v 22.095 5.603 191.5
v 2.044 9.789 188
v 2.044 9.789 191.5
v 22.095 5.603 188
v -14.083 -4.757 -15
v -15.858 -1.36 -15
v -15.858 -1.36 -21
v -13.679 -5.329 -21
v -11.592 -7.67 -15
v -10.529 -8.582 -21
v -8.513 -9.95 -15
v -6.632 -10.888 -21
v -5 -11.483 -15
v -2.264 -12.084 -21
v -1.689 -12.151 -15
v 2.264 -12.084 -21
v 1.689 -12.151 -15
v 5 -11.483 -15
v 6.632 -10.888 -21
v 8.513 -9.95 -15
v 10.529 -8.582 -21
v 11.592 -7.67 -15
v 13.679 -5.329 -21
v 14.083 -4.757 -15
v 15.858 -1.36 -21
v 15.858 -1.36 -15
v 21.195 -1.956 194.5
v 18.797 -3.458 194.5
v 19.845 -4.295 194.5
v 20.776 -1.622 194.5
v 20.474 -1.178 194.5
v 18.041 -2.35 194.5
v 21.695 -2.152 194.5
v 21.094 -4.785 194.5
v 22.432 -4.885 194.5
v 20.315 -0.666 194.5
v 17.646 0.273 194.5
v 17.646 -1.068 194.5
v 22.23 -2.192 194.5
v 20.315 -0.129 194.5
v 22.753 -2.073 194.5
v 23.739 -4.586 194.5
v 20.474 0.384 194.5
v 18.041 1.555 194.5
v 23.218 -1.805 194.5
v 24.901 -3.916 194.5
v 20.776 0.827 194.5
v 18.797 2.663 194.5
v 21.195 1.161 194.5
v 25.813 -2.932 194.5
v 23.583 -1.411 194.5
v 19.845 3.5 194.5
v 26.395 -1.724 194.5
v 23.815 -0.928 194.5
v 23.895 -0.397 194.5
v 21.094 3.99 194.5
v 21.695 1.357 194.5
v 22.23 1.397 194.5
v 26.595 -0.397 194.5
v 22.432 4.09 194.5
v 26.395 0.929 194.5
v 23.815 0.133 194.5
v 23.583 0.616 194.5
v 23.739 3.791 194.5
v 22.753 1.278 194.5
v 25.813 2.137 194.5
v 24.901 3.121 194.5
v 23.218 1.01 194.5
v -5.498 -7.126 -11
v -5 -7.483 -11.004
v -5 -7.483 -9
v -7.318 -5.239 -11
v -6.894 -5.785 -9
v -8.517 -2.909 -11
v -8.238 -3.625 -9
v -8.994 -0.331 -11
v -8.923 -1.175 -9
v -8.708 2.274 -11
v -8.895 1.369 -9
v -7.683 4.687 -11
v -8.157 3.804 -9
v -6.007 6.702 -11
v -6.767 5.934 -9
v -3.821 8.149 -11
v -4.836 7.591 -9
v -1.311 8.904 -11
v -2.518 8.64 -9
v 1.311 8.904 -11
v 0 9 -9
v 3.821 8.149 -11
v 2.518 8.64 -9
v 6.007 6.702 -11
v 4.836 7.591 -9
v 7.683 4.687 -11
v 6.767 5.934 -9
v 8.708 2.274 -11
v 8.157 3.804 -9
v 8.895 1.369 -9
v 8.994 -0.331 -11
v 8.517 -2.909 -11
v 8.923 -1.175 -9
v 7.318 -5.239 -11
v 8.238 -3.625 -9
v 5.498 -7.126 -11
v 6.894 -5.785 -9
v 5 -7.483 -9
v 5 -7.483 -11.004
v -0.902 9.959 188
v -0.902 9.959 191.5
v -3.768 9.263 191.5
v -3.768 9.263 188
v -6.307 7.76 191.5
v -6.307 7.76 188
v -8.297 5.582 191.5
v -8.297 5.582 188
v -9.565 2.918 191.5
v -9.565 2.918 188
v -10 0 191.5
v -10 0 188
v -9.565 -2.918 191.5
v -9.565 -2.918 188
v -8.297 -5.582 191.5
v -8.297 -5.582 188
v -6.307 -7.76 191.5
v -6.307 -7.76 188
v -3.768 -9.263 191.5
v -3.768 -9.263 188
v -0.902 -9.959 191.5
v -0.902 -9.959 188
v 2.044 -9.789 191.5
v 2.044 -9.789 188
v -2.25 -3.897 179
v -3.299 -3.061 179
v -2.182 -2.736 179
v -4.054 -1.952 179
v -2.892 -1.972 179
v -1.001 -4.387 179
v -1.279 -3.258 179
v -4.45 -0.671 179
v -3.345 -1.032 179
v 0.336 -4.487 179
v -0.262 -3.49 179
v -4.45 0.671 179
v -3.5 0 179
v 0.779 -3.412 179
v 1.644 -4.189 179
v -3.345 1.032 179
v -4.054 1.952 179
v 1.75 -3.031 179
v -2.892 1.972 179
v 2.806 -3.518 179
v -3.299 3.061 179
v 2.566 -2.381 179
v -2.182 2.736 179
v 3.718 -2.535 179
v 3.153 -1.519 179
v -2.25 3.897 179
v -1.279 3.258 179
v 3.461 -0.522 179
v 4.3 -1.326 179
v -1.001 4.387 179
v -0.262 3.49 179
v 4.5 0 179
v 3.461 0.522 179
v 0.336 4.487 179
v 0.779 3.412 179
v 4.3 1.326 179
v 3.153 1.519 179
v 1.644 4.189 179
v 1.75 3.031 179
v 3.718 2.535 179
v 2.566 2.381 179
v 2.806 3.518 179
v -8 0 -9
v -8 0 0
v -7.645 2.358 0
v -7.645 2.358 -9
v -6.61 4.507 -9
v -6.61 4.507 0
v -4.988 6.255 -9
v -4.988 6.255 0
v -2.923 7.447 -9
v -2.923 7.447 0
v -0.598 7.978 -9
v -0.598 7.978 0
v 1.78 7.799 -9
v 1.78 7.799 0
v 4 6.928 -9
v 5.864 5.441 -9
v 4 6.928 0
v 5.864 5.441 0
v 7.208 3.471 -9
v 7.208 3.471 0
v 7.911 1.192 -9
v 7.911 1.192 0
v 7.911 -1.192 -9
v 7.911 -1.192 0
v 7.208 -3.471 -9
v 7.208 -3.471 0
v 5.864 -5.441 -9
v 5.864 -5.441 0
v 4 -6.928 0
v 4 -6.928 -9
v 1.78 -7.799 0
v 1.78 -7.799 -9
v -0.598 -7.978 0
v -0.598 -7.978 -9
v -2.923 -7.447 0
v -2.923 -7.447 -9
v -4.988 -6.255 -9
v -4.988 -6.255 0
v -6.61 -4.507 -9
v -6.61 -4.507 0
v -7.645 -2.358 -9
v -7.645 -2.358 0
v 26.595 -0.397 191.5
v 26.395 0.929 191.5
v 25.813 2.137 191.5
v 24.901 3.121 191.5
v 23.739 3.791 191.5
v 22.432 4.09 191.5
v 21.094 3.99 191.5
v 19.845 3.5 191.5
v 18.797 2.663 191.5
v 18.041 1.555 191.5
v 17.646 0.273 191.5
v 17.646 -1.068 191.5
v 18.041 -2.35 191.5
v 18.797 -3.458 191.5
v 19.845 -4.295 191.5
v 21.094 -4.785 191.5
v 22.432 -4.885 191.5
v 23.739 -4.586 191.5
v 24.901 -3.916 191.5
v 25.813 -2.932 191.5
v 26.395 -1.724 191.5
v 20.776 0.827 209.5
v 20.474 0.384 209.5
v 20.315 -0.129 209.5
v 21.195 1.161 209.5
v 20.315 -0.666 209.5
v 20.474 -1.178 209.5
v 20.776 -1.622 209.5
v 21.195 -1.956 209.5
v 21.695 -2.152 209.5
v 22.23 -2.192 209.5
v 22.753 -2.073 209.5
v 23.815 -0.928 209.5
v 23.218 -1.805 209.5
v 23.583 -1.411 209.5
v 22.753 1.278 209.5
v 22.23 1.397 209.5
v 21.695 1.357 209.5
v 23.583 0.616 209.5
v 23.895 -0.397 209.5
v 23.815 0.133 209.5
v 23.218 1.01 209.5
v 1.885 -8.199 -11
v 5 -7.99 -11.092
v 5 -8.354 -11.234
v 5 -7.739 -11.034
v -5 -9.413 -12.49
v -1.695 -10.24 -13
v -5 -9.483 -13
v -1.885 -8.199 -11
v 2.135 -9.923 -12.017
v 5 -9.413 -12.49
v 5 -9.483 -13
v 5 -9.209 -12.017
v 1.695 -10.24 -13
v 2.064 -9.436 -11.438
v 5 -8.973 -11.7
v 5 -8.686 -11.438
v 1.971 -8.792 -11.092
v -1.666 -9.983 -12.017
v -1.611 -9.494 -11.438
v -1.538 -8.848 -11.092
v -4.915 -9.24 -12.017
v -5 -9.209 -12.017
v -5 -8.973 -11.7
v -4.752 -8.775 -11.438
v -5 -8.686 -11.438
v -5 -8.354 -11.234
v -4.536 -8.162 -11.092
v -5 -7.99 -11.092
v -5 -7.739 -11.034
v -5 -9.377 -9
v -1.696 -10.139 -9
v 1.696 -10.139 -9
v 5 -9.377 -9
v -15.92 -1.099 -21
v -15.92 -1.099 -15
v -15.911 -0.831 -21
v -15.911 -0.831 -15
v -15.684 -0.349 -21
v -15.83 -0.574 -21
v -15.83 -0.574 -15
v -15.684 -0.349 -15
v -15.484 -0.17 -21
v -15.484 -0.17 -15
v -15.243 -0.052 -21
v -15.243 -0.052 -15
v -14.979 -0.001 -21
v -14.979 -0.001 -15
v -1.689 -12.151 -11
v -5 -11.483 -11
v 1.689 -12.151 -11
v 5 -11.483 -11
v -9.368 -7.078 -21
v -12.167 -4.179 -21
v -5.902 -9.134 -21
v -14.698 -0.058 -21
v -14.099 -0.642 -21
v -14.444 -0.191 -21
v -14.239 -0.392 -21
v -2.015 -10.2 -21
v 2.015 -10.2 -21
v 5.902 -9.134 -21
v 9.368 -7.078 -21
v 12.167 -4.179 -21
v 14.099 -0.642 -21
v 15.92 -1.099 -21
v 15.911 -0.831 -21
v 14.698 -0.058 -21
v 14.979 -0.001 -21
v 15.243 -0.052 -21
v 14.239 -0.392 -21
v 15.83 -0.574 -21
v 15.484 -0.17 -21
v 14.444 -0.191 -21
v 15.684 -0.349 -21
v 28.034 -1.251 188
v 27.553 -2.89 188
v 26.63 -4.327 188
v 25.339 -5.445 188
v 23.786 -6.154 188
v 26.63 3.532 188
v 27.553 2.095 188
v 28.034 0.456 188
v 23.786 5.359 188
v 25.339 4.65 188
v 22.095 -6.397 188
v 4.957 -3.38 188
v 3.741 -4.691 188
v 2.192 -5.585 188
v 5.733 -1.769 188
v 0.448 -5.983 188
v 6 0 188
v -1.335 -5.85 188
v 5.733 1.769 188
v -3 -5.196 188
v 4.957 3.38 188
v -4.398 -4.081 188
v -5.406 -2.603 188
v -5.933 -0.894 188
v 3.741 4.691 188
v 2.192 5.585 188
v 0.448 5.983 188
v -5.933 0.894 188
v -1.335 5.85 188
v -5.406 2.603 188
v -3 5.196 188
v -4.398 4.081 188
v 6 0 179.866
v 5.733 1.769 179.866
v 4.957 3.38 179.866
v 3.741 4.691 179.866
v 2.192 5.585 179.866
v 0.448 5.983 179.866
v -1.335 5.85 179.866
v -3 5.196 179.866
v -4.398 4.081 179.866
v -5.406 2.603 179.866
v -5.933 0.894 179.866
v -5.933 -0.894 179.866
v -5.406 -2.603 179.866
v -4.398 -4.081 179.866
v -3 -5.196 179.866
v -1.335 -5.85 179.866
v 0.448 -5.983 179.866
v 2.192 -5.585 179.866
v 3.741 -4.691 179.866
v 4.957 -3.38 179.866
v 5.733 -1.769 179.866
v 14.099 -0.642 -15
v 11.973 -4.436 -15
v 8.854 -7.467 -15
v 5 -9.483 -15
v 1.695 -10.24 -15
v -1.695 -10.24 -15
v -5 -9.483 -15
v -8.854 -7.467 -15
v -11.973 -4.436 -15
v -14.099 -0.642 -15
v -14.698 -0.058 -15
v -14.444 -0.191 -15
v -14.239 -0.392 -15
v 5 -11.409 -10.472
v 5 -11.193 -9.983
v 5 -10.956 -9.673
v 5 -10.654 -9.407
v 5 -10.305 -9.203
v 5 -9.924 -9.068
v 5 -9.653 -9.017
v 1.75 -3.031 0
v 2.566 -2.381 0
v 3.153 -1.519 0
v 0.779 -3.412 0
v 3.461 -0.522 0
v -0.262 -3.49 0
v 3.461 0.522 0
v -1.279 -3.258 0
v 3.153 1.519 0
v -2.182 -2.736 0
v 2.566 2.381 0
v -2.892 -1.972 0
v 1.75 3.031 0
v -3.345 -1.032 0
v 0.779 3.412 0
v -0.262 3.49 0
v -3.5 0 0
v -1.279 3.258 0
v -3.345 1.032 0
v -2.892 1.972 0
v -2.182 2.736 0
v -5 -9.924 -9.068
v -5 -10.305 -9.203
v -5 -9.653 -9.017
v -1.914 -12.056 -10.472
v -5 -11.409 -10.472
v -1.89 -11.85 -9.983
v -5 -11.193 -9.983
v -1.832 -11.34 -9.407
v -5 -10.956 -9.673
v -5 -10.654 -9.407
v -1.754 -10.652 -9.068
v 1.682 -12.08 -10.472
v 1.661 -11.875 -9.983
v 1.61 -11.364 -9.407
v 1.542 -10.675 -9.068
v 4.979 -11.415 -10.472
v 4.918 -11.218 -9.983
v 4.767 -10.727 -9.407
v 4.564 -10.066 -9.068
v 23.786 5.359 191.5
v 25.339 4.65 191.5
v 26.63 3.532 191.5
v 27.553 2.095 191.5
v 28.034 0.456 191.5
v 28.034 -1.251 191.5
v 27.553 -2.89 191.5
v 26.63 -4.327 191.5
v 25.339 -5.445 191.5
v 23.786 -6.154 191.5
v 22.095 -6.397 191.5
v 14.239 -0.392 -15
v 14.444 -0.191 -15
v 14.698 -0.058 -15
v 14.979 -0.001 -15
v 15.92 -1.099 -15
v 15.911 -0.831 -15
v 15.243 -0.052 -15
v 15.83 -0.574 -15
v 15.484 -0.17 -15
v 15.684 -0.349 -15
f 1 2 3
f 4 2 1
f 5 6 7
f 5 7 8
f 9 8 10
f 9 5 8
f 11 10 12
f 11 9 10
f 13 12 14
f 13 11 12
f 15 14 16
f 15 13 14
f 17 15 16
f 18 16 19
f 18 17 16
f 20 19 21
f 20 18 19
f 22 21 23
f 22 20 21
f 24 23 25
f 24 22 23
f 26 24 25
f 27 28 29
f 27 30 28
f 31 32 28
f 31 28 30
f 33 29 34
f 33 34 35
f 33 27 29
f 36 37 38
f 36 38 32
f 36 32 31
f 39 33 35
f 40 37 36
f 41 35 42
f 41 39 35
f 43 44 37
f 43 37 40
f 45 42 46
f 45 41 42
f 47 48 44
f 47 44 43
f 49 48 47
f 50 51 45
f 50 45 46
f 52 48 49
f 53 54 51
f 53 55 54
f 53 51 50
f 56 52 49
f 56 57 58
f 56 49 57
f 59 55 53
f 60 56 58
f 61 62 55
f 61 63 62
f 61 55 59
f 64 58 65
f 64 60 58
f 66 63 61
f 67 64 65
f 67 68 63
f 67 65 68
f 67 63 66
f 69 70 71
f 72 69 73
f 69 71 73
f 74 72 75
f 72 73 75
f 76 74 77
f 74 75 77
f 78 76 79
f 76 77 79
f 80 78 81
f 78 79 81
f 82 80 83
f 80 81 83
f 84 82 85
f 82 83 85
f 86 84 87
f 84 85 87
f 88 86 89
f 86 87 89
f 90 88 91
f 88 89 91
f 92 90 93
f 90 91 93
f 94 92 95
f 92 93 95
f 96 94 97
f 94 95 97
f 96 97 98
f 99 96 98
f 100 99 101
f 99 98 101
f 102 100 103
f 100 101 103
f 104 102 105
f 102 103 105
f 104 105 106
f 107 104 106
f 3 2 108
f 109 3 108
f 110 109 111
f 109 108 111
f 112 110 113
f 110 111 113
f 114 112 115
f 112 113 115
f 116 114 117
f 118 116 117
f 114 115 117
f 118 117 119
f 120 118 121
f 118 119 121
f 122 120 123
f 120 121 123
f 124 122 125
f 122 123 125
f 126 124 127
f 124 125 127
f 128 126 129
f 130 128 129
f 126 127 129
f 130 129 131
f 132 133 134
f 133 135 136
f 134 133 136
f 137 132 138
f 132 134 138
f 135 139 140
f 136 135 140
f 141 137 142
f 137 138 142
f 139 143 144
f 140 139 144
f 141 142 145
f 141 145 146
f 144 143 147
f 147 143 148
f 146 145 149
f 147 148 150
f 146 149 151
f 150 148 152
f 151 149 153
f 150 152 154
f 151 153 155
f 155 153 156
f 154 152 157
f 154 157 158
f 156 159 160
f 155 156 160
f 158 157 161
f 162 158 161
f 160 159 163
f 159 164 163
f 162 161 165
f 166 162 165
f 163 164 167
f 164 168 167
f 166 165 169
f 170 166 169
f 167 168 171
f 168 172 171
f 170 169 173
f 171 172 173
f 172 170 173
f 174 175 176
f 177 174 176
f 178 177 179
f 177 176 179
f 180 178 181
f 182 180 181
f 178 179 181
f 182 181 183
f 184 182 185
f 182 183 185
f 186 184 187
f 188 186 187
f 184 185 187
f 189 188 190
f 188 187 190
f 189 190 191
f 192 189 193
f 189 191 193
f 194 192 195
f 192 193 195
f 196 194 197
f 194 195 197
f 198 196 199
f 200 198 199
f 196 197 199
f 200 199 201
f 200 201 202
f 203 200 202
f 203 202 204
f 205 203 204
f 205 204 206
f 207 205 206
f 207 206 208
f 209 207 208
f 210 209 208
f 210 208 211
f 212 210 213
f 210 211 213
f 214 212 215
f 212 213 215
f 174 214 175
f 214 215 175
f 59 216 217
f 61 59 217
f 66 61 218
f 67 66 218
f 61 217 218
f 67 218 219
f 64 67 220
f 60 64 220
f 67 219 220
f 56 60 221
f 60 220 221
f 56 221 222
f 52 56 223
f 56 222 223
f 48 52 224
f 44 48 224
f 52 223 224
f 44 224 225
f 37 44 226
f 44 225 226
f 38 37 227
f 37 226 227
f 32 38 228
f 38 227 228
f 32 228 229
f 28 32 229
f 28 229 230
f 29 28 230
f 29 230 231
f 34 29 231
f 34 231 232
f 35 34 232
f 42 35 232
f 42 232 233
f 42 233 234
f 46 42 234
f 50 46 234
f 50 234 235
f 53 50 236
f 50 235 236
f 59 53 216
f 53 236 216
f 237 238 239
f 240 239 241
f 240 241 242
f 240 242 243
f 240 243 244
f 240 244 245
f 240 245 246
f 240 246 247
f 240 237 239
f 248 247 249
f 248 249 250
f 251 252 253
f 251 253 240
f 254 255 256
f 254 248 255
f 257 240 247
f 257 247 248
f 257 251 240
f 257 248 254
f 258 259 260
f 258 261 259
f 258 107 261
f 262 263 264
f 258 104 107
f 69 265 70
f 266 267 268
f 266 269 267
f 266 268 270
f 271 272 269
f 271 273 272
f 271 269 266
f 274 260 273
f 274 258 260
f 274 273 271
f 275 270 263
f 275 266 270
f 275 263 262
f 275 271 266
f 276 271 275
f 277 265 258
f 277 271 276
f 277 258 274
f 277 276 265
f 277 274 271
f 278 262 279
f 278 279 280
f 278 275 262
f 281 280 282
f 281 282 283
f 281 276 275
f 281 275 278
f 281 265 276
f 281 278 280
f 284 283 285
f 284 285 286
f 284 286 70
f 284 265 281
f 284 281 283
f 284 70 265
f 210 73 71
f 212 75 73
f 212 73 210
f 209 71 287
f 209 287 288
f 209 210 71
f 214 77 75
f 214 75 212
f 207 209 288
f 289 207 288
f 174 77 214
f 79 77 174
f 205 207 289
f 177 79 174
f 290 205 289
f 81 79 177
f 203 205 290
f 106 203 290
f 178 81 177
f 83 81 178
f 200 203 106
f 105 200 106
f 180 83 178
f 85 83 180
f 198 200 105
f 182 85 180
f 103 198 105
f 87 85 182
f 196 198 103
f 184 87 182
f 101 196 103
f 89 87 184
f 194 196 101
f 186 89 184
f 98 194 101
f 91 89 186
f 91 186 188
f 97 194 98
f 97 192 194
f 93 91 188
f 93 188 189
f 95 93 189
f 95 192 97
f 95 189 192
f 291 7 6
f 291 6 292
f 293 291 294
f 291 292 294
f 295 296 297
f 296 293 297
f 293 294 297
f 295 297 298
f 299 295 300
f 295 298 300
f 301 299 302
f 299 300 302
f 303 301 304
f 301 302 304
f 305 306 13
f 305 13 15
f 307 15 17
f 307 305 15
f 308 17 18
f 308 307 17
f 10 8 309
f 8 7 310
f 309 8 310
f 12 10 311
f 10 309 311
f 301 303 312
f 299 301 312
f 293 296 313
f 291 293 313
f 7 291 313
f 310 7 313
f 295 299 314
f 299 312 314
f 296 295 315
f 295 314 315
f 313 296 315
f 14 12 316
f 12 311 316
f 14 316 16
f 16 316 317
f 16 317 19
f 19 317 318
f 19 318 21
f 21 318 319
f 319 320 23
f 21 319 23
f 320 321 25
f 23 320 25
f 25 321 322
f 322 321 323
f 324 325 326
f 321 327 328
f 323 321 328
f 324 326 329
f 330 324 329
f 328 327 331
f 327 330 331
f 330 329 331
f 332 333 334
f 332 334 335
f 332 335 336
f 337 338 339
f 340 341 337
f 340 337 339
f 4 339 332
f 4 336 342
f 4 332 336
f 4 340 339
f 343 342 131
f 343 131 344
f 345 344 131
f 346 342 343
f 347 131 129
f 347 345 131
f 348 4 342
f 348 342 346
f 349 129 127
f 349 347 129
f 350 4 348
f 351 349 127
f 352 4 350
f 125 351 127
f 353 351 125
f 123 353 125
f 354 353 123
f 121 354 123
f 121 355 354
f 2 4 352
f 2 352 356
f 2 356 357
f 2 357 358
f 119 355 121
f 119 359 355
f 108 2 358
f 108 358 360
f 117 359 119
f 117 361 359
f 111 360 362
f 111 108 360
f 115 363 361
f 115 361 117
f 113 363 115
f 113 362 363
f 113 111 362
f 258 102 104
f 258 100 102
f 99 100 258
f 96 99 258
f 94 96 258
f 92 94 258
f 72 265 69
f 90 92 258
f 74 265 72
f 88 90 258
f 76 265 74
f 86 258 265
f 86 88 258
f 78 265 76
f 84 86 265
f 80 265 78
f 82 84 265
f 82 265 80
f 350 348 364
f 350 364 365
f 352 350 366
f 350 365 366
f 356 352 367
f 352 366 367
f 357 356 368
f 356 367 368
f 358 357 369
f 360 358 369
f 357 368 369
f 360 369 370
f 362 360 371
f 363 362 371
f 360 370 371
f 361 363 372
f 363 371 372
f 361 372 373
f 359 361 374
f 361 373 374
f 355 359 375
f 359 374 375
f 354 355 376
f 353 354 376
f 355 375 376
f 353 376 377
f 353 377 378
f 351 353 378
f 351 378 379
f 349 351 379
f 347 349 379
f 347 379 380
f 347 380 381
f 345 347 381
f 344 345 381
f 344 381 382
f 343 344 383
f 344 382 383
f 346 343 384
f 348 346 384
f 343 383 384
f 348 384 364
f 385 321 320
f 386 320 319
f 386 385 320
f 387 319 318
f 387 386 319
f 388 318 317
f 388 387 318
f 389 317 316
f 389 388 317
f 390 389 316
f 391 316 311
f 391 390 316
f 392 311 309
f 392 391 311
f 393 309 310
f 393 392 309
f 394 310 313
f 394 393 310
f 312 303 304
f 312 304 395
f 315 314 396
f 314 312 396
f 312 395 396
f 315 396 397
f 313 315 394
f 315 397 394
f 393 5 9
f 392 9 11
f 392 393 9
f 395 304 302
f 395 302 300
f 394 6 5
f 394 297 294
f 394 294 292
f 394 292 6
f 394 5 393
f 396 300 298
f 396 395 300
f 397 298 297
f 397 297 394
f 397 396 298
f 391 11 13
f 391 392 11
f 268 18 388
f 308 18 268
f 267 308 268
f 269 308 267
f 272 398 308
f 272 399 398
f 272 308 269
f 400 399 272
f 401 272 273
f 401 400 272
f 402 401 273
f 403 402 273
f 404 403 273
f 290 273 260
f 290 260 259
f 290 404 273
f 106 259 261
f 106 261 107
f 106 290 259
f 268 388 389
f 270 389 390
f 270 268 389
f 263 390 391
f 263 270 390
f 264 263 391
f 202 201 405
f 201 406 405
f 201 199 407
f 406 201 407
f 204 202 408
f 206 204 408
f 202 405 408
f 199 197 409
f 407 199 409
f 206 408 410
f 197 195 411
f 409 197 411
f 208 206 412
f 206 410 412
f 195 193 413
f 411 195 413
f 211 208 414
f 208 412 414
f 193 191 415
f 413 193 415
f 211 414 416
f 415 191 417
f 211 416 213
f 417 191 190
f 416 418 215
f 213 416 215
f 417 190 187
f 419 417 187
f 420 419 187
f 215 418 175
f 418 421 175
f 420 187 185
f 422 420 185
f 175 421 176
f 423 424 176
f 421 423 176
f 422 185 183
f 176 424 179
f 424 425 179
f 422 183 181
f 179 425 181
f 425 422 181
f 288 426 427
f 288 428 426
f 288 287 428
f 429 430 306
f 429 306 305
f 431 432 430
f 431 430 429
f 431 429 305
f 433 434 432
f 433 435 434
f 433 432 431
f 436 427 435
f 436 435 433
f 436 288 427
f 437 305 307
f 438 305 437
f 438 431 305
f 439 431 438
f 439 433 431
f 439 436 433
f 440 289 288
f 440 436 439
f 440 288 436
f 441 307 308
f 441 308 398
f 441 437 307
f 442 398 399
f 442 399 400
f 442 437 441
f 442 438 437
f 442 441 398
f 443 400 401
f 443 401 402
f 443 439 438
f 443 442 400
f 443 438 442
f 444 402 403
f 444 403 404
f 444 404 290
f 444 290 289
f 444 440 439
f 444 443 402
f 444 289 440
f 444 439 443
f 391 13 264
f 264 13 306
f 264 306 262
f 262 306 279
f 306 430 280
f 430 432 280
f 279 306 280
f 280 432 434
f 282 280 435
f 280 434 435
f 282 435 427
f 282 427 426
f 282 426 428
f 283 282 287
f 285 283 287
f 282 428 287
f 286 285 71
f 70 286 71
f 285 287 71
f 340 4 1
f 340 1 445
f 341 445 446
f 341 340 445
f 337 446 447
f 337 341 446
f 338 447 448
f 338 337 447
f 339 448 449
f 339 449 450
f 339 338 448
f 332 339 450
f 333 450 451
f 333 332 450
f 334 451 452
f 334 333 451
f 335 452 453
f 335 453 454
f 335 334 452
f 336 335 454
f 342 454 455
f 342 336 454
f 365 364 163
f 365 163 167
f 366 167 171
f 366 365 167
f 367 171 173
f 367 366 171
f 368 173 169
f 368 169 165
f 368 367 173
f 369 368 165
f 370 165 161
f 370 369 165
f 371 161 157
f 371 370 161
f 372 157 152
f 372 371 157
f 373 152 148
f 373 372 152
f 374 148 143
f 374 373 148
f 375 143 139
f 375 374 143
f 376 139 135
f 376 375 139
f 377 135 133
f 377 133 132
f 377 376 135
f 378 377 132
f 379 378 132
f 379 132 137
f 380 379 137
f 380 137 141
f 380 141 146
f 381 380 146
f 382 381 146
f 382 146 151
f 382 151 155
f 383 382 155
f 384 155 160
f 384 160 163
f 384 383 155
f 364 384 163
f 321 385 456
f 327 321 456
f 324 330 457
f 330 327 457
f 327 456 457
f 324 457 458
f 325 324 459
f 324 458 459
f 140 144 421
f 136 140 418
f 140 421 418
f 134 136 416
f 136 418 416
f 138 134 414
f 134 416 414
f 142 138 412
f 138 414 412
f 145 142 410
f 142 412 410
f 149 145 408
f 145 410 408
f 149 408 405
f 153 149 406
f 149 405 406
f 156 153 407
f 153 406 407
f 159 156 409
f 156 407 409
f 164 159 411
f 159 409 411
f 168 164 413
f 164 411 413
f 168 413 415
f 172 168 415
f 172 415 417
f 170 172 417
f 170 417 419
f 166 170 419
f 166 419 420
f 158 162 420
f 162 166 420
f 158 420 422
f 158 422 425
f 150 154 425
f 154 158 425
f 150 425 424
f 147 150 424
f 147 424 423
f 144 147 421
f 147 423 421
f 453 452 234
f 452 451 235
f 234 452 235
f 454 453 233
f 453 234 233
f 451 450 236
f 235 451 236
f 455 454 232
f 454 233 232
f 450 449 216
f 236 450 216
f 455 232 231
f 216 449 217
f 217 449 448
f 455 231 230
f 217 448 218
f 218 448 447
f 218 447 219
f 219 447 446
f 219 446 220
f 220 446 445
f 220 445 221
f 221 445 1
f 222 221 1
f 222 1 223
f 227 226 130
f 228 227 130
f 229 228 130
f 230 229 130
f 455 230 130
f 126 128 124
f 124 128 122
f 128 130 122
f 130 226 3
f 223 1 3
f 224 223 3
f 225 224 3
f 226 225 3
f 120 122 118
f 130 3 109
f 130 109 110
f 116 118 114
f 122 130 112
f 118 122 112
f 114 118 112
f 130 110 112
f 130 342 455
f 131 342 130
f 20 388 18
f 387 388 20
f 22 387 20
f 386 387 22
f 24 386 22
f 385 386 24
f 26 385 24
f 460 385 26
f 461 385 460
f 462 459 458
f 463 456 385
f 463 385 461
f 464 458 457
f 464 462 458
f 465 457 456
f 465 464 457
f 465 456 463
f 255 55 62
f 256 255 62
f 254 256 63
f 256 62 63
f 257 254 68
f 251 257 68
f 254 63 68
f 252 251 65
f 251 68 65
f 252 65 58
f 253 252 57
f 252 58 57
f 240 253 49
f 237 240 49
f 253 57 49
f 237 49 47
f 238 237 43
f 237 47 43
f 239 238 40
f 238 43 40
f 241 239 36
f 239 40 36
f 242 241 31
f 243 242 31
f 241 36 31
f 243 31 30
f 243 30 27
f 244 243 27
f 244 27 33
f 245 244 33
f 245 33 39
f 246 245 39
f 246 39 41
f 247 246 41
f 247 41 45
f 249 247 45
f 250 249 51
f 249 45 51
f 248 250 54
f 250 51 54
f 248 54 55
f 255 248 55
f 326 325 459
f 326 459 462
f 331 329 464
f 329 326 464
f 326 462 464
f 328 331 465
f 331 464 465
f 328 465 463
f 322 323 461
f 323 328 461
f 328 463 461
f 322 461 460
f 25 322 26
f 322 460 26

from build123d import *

# Parameters (mm, degrees)
CROQUIS1_R                   = 3.5
SALIENTE_EXTRUIR1_DEPTH      = 180
SALIENTE_EXTRUIR2_DEPTH      = 8
SALIENTE_EXTRUIR2_DEPTH_BACK = 1
CROQUIS2_R                   = 6
CROQUIS3_R                   = 10
SALIENTE_EXTRUIR3_DEPTH      = 3.5
SALIENTE_EXTRUIR4_START      = -3.5
SALIENTE_EXTRUIR4_DEPTH      = 3.5
CHAFL_N1_SIZE                = 1.5
CHAFL_N1_SIZE2               = 0.866025404
CROQUIS5_R                   = 8
SALIENTE_EXTRUIR5_DEPTH      = 9
CROQUIS6_R                   = 9
SALIENTE_EXTRUIR6_DEPTH      = 2
SALIENTE_EXTRUIR7_START      = -2
SALIENTE_EXTRUIR7_DEPTH      = 2
CROQUIS12_R                  = 4.5
SALIENTE_EXTRUIR11_DEPTH     = 3
CROQUIS13_R                  = 1.8
SALIENTE_EXTRUIR12_DEPTH     = 15
CROQUIS18_W                  = 10
CROQUIS18_H                  = 2
SALIENTE_EXTRUIR16_DEPTH     = 4
SALIENTE_EXTRUIR17_DEPTH     = 6
CORTAR_EXTRUIR3_START        = -4
CORTAR_EXTRUIR3_DEPTH        = 4
SALIENTE_EXTRUIR18_START     = 6
SALIENTE_EXTRUIR18_DEPTH     = 6
REDONDEO7_R                  = 2
REDONDEO8_R                  = 1


with BuildPart() as part:
    # Croquis1 → Saliente-Extruir1 (new body)
    with BuildSketch(Plane.XY):
        with Locations(Location((0, 0, 0), (0, 0, 180))):
            Circle(CROQUIS1_R)
    extrude(amount=SALIENTE_EXTRUIR1_DEPTH)

    # Croquis2 → Saliente-Extruir2 (add, two sides: drawn at the far end of the back side and taken through both)
    with BuildSketch(Plane.XY.offset(180).offset(-SALIENTE_EXTRUIR2_DEPTH_BACK)):
        Circle(CROQUIS2_R)
    extrude(amount=SALIENTE_EXTRUIR2_DEPTH + SALIENTE_EXTRUIR2_DEPTH_BACK)

    # Croquis3 → Saliente-Extruir3 (add)
    with BuildSketch(Plane.XY.offset(188)):
        Circle(CROQUIS3_R)
    extrude(amount=SALIENTE_EXTRUIR3_DEPTH)

    # Croquis4 → Saliente-Extruir4 (add)
    with BuildSketch(Plane.XY.offset(191.5).offset(SALIENTE_EXTRUIR4_START)):
        with BuildLine():
            Line((2.043748165, 9.788927083), (22.095380186, 5.602514639))
            ThreePointArc((22.095380186, 5.602514639), (28.095380186, -0.397485361), (22.095380186, -6.397485361))
            Line((22.095380186, -6.397485361), (2.043748165, -9.788927083))
            ThreePointArc((2.043748165, -9.788927083), (10, 0), (2.043748165, 9.788927083))
        make_face()
    extrude(amount=SALIENTE_EXTRUIR4_DEPTH)

    # Chaflán1
    chafl_n1_edges = [part.edges().sort_by_distance(p)[0] for p in [
        (-6, 0, 179),
    ]]
    chafl_n1_side = [part.faces().sort_by_distance(p)[0] for p in [
        (-5.830294373, 0, 179),
    ]]
    chamfer(chafl_n1_edges, length=CHAFL_N1_SIZE, length2=CHAFL_N1_SIZE2, reference=chafl_n1_side[0])

    # Croquis5 → Saliente-Extruir5 (add)
    with BuildSketch(Plane(origin=(0, 0, 0), x_dir=(-1, 0, 0), z_dir=(0, 0, -1))):
        Circle(CROQUIS5_R)
    extrude(amount=SALIENTE_EXTRUIR5_DEPTH)

    # Croquis6 → Saliente-Extruir6 (add)
    with BuildSketch(Plane(origin=(0, 0, -9), x_dir=(-1, 0, 0), z_dir=(0, 0, -1))):
        Circle(CROQUIS6_R)
    extrude(amount=SALIENTE_EXTRUIR6_DEPTH)

    # Croquis7 → Saliente-Extruir7 (add)
    with BuildSketch(Plane(origin=(0, 0, -11), x_dir=(-1, 0, 0), z_dir=(0, 0, -1)).offset(SALIENTE_EXTRUIR7_START)):
        with BuildLine():
            Line((-5, -7.483314774), (-5, -11.483314774))
            Line((-5, -11.483314774), (5, -11.483314774))
            Line((5, -11.483314774), (5, -7.483314774))
            ThreePointArc((5, -7.483314774), (0, -9), (-5, -7.483314774))
        make_face()
    extrude(amount=SALIENTE_EXTRUIR7_DEPTH)

    # Croquis12 → Saliente-Extruir11 (add)
    with BuildSketch(Plane.XY.offset(191.5)):
        with Locations((22.095380186, -0.397485361)):
            Circle(CROQUIS12_R)
    extrude(amount=SALIENTE_EXTRUIR11_DEPTH)

    # Croquis13 → Saliente-Extruir12 (add)
    with BuildSketch(Plane.XY.offset(194.5)):
        with Locations((22.095380186, -0.397485361)):
            Circle(CROQUIS13_R)
    extrude(amount=SALIENTE_EXTRUIR12_DEPTH)

    # Croquis18 → Saliente-Extruir16 (add)
    with BuildSketch(Plane(origin=(0, 0, -11), x_dir=(-1, 0, 0), z_dir=(0, 0, -1))):
        with Locations((0, -10.483314774)):
            Rectangle(CROQUIS18_W, CROQUIS18_H)
    extrude(amount=SALIENTE_EXTRUIR16_DEPTH)

    # Croquis19 → Saliente-Extruir17 (add)
    with BuildSketch(Plane(origin=(0, 0, -15), x_dir=(-1, 0, 0), z_dir=(0, 0, -1))):
        with BuildLine():
            Line((14.328458937, 0), (16.318610319, 0))
            ThreePointArc((16.318610319, 0), (0, -12.235237964), (-16.318610319, 0))
            Line((-16.318610319, 0), (-14.328458937, 0))
            ThreePointArc((-14.328458937, 0), (0, -10.335161566), (14.328458937, 0))
        make_face()
    extrude(amount=SALIENTE_EXTRUIR17_DEPTH)

    # Croquis20 → Cortar-Extruir3 (cut)
    with BuildSketch(Plane(origin=(0, 0, -15), x_dir=(-1, 0, 0), z_dir=(0, 0, -1)).offset(CORTAR_EXTRUIR3_START)):
        with BuildLine():
            Line((5, -9.483314774), (-5, -9.483314774))
            ThreePointArc((-5, -9.483314774), (0, -10.335161566), (5, -9.483314774))
        make_face()
    extrude(amount=CORTAR_EXTRUIR3_DEPTH, mode=Mode.SUBTRACT)

    # Croquis21 → Saliente-Extruir18 (add)
    with BuildSketch(Plane.XY.offset(-15).offset(SALIENTE_EXTRUIR18_START)):
        with BuildLine():
            Line((5, -11.483314774), (-5, -11.483314774))
            ThreePointArc((-5, -11.483314774), (0, -12.235237964), (5, -11.483314774))
        make_face()
    extrude(amount=-SALIENTE_EXTRUIR18_DEPTH)

    # Redondeo7
    redondeo7_edges = [part.edges().sort_by_distance(p)[0] for p in [
        (0, -12.235237964, -9),
        (0, -10.335161566, -11),
    ]]
    fillet(redondeo7_edges, radius=REDONDEO7_R)

    # Redondeo8
    # the kernel refuses this fillet: 1 mm, written as the material it takes off along each edge
    with BuildSketch(Plane(origin=(-16.318610319, 0, -11.409775172), x_dir=(0.3205749609840578, -0.9472231492051225, 0), z_dir=(0, 0, -1))) as redondeo8_piece_1:
        with BuildLine():
            CenterArc((1.393851992, -0.99910758), REDONDEO8_R, 87.579224192, 111.118475452)
            Line((0.446628843, -1.319682541), (0, 0))
            ThreePointArc((0, 0), (0.718044966, 0.015171139), (1.436089931, 0))
        make_face()
    extrude(amount=13.180449656, mode=Mode.SUBTRACT)
    with BuildSketch(Plane(origin=(-14.328458937, 0, -13.239980297), x_dir=(0.3368909660560179, -0.9415436670648064, 0), z_dir=(0, 0, -1))) as redondeo8_piece_2:
        with BuildLine():
            CenterArc((0.704369772, 0.999745128), REDONDEO8_R, 199.687567709, 69.018809156)
            Line((-0.237173895, 0.662854162), (0, 0))
            ThreePointArc((0, 0), (0.340896854, 0.003848545), (0.681793707, 0))
        make_face()
    extrude(amount=9.520039406, mode=Mode.SUBTRACT)
    with BuildSketch(Plane(origin=(16.318610319, 0, -11.409775172), x_dir=(-0.3205749609840585, -0.9472231492051224, 0), z_dir=(0, 0, -1))) as redondeo8_piece_3:
        with BuildLine():
            CenterArc((1.393851992, 0.99910758), REDONDEO8_R, 161.302300356, 111.118475452)
            Line((0.446628843, 1.319682541), (0, 0))
            ThreePointArc((0, 0), (0.718044966, -0.015171139), (1.436089931, 0))
        make_face()
    extrude(amount=13.180449656, mode=Mode.SUBTRACT)
    with BuildSketch(Plane(origin=(14.328458937, 0, -13.239980297), x_dir=(-0.33689096605601593, -0.9415436670648072, 0), z_dir=(0, 0, -1))) as redondeo8_piece_4:
        with BuildLine():
            CenterArc((0.704369772, -0.999745128), REDONDEO8_R, 91.293623135, 69.018809156)
            Line((-0.237173895, -0.662854162), (0, 0))
            ThreePointArc((0, 0), (0.340896854, -0.003848545), (0.681793707, 0))
        make_face()
    extrude(amount=9.520039406, mode=Mode.SUBTRACT)


solid = part.part
